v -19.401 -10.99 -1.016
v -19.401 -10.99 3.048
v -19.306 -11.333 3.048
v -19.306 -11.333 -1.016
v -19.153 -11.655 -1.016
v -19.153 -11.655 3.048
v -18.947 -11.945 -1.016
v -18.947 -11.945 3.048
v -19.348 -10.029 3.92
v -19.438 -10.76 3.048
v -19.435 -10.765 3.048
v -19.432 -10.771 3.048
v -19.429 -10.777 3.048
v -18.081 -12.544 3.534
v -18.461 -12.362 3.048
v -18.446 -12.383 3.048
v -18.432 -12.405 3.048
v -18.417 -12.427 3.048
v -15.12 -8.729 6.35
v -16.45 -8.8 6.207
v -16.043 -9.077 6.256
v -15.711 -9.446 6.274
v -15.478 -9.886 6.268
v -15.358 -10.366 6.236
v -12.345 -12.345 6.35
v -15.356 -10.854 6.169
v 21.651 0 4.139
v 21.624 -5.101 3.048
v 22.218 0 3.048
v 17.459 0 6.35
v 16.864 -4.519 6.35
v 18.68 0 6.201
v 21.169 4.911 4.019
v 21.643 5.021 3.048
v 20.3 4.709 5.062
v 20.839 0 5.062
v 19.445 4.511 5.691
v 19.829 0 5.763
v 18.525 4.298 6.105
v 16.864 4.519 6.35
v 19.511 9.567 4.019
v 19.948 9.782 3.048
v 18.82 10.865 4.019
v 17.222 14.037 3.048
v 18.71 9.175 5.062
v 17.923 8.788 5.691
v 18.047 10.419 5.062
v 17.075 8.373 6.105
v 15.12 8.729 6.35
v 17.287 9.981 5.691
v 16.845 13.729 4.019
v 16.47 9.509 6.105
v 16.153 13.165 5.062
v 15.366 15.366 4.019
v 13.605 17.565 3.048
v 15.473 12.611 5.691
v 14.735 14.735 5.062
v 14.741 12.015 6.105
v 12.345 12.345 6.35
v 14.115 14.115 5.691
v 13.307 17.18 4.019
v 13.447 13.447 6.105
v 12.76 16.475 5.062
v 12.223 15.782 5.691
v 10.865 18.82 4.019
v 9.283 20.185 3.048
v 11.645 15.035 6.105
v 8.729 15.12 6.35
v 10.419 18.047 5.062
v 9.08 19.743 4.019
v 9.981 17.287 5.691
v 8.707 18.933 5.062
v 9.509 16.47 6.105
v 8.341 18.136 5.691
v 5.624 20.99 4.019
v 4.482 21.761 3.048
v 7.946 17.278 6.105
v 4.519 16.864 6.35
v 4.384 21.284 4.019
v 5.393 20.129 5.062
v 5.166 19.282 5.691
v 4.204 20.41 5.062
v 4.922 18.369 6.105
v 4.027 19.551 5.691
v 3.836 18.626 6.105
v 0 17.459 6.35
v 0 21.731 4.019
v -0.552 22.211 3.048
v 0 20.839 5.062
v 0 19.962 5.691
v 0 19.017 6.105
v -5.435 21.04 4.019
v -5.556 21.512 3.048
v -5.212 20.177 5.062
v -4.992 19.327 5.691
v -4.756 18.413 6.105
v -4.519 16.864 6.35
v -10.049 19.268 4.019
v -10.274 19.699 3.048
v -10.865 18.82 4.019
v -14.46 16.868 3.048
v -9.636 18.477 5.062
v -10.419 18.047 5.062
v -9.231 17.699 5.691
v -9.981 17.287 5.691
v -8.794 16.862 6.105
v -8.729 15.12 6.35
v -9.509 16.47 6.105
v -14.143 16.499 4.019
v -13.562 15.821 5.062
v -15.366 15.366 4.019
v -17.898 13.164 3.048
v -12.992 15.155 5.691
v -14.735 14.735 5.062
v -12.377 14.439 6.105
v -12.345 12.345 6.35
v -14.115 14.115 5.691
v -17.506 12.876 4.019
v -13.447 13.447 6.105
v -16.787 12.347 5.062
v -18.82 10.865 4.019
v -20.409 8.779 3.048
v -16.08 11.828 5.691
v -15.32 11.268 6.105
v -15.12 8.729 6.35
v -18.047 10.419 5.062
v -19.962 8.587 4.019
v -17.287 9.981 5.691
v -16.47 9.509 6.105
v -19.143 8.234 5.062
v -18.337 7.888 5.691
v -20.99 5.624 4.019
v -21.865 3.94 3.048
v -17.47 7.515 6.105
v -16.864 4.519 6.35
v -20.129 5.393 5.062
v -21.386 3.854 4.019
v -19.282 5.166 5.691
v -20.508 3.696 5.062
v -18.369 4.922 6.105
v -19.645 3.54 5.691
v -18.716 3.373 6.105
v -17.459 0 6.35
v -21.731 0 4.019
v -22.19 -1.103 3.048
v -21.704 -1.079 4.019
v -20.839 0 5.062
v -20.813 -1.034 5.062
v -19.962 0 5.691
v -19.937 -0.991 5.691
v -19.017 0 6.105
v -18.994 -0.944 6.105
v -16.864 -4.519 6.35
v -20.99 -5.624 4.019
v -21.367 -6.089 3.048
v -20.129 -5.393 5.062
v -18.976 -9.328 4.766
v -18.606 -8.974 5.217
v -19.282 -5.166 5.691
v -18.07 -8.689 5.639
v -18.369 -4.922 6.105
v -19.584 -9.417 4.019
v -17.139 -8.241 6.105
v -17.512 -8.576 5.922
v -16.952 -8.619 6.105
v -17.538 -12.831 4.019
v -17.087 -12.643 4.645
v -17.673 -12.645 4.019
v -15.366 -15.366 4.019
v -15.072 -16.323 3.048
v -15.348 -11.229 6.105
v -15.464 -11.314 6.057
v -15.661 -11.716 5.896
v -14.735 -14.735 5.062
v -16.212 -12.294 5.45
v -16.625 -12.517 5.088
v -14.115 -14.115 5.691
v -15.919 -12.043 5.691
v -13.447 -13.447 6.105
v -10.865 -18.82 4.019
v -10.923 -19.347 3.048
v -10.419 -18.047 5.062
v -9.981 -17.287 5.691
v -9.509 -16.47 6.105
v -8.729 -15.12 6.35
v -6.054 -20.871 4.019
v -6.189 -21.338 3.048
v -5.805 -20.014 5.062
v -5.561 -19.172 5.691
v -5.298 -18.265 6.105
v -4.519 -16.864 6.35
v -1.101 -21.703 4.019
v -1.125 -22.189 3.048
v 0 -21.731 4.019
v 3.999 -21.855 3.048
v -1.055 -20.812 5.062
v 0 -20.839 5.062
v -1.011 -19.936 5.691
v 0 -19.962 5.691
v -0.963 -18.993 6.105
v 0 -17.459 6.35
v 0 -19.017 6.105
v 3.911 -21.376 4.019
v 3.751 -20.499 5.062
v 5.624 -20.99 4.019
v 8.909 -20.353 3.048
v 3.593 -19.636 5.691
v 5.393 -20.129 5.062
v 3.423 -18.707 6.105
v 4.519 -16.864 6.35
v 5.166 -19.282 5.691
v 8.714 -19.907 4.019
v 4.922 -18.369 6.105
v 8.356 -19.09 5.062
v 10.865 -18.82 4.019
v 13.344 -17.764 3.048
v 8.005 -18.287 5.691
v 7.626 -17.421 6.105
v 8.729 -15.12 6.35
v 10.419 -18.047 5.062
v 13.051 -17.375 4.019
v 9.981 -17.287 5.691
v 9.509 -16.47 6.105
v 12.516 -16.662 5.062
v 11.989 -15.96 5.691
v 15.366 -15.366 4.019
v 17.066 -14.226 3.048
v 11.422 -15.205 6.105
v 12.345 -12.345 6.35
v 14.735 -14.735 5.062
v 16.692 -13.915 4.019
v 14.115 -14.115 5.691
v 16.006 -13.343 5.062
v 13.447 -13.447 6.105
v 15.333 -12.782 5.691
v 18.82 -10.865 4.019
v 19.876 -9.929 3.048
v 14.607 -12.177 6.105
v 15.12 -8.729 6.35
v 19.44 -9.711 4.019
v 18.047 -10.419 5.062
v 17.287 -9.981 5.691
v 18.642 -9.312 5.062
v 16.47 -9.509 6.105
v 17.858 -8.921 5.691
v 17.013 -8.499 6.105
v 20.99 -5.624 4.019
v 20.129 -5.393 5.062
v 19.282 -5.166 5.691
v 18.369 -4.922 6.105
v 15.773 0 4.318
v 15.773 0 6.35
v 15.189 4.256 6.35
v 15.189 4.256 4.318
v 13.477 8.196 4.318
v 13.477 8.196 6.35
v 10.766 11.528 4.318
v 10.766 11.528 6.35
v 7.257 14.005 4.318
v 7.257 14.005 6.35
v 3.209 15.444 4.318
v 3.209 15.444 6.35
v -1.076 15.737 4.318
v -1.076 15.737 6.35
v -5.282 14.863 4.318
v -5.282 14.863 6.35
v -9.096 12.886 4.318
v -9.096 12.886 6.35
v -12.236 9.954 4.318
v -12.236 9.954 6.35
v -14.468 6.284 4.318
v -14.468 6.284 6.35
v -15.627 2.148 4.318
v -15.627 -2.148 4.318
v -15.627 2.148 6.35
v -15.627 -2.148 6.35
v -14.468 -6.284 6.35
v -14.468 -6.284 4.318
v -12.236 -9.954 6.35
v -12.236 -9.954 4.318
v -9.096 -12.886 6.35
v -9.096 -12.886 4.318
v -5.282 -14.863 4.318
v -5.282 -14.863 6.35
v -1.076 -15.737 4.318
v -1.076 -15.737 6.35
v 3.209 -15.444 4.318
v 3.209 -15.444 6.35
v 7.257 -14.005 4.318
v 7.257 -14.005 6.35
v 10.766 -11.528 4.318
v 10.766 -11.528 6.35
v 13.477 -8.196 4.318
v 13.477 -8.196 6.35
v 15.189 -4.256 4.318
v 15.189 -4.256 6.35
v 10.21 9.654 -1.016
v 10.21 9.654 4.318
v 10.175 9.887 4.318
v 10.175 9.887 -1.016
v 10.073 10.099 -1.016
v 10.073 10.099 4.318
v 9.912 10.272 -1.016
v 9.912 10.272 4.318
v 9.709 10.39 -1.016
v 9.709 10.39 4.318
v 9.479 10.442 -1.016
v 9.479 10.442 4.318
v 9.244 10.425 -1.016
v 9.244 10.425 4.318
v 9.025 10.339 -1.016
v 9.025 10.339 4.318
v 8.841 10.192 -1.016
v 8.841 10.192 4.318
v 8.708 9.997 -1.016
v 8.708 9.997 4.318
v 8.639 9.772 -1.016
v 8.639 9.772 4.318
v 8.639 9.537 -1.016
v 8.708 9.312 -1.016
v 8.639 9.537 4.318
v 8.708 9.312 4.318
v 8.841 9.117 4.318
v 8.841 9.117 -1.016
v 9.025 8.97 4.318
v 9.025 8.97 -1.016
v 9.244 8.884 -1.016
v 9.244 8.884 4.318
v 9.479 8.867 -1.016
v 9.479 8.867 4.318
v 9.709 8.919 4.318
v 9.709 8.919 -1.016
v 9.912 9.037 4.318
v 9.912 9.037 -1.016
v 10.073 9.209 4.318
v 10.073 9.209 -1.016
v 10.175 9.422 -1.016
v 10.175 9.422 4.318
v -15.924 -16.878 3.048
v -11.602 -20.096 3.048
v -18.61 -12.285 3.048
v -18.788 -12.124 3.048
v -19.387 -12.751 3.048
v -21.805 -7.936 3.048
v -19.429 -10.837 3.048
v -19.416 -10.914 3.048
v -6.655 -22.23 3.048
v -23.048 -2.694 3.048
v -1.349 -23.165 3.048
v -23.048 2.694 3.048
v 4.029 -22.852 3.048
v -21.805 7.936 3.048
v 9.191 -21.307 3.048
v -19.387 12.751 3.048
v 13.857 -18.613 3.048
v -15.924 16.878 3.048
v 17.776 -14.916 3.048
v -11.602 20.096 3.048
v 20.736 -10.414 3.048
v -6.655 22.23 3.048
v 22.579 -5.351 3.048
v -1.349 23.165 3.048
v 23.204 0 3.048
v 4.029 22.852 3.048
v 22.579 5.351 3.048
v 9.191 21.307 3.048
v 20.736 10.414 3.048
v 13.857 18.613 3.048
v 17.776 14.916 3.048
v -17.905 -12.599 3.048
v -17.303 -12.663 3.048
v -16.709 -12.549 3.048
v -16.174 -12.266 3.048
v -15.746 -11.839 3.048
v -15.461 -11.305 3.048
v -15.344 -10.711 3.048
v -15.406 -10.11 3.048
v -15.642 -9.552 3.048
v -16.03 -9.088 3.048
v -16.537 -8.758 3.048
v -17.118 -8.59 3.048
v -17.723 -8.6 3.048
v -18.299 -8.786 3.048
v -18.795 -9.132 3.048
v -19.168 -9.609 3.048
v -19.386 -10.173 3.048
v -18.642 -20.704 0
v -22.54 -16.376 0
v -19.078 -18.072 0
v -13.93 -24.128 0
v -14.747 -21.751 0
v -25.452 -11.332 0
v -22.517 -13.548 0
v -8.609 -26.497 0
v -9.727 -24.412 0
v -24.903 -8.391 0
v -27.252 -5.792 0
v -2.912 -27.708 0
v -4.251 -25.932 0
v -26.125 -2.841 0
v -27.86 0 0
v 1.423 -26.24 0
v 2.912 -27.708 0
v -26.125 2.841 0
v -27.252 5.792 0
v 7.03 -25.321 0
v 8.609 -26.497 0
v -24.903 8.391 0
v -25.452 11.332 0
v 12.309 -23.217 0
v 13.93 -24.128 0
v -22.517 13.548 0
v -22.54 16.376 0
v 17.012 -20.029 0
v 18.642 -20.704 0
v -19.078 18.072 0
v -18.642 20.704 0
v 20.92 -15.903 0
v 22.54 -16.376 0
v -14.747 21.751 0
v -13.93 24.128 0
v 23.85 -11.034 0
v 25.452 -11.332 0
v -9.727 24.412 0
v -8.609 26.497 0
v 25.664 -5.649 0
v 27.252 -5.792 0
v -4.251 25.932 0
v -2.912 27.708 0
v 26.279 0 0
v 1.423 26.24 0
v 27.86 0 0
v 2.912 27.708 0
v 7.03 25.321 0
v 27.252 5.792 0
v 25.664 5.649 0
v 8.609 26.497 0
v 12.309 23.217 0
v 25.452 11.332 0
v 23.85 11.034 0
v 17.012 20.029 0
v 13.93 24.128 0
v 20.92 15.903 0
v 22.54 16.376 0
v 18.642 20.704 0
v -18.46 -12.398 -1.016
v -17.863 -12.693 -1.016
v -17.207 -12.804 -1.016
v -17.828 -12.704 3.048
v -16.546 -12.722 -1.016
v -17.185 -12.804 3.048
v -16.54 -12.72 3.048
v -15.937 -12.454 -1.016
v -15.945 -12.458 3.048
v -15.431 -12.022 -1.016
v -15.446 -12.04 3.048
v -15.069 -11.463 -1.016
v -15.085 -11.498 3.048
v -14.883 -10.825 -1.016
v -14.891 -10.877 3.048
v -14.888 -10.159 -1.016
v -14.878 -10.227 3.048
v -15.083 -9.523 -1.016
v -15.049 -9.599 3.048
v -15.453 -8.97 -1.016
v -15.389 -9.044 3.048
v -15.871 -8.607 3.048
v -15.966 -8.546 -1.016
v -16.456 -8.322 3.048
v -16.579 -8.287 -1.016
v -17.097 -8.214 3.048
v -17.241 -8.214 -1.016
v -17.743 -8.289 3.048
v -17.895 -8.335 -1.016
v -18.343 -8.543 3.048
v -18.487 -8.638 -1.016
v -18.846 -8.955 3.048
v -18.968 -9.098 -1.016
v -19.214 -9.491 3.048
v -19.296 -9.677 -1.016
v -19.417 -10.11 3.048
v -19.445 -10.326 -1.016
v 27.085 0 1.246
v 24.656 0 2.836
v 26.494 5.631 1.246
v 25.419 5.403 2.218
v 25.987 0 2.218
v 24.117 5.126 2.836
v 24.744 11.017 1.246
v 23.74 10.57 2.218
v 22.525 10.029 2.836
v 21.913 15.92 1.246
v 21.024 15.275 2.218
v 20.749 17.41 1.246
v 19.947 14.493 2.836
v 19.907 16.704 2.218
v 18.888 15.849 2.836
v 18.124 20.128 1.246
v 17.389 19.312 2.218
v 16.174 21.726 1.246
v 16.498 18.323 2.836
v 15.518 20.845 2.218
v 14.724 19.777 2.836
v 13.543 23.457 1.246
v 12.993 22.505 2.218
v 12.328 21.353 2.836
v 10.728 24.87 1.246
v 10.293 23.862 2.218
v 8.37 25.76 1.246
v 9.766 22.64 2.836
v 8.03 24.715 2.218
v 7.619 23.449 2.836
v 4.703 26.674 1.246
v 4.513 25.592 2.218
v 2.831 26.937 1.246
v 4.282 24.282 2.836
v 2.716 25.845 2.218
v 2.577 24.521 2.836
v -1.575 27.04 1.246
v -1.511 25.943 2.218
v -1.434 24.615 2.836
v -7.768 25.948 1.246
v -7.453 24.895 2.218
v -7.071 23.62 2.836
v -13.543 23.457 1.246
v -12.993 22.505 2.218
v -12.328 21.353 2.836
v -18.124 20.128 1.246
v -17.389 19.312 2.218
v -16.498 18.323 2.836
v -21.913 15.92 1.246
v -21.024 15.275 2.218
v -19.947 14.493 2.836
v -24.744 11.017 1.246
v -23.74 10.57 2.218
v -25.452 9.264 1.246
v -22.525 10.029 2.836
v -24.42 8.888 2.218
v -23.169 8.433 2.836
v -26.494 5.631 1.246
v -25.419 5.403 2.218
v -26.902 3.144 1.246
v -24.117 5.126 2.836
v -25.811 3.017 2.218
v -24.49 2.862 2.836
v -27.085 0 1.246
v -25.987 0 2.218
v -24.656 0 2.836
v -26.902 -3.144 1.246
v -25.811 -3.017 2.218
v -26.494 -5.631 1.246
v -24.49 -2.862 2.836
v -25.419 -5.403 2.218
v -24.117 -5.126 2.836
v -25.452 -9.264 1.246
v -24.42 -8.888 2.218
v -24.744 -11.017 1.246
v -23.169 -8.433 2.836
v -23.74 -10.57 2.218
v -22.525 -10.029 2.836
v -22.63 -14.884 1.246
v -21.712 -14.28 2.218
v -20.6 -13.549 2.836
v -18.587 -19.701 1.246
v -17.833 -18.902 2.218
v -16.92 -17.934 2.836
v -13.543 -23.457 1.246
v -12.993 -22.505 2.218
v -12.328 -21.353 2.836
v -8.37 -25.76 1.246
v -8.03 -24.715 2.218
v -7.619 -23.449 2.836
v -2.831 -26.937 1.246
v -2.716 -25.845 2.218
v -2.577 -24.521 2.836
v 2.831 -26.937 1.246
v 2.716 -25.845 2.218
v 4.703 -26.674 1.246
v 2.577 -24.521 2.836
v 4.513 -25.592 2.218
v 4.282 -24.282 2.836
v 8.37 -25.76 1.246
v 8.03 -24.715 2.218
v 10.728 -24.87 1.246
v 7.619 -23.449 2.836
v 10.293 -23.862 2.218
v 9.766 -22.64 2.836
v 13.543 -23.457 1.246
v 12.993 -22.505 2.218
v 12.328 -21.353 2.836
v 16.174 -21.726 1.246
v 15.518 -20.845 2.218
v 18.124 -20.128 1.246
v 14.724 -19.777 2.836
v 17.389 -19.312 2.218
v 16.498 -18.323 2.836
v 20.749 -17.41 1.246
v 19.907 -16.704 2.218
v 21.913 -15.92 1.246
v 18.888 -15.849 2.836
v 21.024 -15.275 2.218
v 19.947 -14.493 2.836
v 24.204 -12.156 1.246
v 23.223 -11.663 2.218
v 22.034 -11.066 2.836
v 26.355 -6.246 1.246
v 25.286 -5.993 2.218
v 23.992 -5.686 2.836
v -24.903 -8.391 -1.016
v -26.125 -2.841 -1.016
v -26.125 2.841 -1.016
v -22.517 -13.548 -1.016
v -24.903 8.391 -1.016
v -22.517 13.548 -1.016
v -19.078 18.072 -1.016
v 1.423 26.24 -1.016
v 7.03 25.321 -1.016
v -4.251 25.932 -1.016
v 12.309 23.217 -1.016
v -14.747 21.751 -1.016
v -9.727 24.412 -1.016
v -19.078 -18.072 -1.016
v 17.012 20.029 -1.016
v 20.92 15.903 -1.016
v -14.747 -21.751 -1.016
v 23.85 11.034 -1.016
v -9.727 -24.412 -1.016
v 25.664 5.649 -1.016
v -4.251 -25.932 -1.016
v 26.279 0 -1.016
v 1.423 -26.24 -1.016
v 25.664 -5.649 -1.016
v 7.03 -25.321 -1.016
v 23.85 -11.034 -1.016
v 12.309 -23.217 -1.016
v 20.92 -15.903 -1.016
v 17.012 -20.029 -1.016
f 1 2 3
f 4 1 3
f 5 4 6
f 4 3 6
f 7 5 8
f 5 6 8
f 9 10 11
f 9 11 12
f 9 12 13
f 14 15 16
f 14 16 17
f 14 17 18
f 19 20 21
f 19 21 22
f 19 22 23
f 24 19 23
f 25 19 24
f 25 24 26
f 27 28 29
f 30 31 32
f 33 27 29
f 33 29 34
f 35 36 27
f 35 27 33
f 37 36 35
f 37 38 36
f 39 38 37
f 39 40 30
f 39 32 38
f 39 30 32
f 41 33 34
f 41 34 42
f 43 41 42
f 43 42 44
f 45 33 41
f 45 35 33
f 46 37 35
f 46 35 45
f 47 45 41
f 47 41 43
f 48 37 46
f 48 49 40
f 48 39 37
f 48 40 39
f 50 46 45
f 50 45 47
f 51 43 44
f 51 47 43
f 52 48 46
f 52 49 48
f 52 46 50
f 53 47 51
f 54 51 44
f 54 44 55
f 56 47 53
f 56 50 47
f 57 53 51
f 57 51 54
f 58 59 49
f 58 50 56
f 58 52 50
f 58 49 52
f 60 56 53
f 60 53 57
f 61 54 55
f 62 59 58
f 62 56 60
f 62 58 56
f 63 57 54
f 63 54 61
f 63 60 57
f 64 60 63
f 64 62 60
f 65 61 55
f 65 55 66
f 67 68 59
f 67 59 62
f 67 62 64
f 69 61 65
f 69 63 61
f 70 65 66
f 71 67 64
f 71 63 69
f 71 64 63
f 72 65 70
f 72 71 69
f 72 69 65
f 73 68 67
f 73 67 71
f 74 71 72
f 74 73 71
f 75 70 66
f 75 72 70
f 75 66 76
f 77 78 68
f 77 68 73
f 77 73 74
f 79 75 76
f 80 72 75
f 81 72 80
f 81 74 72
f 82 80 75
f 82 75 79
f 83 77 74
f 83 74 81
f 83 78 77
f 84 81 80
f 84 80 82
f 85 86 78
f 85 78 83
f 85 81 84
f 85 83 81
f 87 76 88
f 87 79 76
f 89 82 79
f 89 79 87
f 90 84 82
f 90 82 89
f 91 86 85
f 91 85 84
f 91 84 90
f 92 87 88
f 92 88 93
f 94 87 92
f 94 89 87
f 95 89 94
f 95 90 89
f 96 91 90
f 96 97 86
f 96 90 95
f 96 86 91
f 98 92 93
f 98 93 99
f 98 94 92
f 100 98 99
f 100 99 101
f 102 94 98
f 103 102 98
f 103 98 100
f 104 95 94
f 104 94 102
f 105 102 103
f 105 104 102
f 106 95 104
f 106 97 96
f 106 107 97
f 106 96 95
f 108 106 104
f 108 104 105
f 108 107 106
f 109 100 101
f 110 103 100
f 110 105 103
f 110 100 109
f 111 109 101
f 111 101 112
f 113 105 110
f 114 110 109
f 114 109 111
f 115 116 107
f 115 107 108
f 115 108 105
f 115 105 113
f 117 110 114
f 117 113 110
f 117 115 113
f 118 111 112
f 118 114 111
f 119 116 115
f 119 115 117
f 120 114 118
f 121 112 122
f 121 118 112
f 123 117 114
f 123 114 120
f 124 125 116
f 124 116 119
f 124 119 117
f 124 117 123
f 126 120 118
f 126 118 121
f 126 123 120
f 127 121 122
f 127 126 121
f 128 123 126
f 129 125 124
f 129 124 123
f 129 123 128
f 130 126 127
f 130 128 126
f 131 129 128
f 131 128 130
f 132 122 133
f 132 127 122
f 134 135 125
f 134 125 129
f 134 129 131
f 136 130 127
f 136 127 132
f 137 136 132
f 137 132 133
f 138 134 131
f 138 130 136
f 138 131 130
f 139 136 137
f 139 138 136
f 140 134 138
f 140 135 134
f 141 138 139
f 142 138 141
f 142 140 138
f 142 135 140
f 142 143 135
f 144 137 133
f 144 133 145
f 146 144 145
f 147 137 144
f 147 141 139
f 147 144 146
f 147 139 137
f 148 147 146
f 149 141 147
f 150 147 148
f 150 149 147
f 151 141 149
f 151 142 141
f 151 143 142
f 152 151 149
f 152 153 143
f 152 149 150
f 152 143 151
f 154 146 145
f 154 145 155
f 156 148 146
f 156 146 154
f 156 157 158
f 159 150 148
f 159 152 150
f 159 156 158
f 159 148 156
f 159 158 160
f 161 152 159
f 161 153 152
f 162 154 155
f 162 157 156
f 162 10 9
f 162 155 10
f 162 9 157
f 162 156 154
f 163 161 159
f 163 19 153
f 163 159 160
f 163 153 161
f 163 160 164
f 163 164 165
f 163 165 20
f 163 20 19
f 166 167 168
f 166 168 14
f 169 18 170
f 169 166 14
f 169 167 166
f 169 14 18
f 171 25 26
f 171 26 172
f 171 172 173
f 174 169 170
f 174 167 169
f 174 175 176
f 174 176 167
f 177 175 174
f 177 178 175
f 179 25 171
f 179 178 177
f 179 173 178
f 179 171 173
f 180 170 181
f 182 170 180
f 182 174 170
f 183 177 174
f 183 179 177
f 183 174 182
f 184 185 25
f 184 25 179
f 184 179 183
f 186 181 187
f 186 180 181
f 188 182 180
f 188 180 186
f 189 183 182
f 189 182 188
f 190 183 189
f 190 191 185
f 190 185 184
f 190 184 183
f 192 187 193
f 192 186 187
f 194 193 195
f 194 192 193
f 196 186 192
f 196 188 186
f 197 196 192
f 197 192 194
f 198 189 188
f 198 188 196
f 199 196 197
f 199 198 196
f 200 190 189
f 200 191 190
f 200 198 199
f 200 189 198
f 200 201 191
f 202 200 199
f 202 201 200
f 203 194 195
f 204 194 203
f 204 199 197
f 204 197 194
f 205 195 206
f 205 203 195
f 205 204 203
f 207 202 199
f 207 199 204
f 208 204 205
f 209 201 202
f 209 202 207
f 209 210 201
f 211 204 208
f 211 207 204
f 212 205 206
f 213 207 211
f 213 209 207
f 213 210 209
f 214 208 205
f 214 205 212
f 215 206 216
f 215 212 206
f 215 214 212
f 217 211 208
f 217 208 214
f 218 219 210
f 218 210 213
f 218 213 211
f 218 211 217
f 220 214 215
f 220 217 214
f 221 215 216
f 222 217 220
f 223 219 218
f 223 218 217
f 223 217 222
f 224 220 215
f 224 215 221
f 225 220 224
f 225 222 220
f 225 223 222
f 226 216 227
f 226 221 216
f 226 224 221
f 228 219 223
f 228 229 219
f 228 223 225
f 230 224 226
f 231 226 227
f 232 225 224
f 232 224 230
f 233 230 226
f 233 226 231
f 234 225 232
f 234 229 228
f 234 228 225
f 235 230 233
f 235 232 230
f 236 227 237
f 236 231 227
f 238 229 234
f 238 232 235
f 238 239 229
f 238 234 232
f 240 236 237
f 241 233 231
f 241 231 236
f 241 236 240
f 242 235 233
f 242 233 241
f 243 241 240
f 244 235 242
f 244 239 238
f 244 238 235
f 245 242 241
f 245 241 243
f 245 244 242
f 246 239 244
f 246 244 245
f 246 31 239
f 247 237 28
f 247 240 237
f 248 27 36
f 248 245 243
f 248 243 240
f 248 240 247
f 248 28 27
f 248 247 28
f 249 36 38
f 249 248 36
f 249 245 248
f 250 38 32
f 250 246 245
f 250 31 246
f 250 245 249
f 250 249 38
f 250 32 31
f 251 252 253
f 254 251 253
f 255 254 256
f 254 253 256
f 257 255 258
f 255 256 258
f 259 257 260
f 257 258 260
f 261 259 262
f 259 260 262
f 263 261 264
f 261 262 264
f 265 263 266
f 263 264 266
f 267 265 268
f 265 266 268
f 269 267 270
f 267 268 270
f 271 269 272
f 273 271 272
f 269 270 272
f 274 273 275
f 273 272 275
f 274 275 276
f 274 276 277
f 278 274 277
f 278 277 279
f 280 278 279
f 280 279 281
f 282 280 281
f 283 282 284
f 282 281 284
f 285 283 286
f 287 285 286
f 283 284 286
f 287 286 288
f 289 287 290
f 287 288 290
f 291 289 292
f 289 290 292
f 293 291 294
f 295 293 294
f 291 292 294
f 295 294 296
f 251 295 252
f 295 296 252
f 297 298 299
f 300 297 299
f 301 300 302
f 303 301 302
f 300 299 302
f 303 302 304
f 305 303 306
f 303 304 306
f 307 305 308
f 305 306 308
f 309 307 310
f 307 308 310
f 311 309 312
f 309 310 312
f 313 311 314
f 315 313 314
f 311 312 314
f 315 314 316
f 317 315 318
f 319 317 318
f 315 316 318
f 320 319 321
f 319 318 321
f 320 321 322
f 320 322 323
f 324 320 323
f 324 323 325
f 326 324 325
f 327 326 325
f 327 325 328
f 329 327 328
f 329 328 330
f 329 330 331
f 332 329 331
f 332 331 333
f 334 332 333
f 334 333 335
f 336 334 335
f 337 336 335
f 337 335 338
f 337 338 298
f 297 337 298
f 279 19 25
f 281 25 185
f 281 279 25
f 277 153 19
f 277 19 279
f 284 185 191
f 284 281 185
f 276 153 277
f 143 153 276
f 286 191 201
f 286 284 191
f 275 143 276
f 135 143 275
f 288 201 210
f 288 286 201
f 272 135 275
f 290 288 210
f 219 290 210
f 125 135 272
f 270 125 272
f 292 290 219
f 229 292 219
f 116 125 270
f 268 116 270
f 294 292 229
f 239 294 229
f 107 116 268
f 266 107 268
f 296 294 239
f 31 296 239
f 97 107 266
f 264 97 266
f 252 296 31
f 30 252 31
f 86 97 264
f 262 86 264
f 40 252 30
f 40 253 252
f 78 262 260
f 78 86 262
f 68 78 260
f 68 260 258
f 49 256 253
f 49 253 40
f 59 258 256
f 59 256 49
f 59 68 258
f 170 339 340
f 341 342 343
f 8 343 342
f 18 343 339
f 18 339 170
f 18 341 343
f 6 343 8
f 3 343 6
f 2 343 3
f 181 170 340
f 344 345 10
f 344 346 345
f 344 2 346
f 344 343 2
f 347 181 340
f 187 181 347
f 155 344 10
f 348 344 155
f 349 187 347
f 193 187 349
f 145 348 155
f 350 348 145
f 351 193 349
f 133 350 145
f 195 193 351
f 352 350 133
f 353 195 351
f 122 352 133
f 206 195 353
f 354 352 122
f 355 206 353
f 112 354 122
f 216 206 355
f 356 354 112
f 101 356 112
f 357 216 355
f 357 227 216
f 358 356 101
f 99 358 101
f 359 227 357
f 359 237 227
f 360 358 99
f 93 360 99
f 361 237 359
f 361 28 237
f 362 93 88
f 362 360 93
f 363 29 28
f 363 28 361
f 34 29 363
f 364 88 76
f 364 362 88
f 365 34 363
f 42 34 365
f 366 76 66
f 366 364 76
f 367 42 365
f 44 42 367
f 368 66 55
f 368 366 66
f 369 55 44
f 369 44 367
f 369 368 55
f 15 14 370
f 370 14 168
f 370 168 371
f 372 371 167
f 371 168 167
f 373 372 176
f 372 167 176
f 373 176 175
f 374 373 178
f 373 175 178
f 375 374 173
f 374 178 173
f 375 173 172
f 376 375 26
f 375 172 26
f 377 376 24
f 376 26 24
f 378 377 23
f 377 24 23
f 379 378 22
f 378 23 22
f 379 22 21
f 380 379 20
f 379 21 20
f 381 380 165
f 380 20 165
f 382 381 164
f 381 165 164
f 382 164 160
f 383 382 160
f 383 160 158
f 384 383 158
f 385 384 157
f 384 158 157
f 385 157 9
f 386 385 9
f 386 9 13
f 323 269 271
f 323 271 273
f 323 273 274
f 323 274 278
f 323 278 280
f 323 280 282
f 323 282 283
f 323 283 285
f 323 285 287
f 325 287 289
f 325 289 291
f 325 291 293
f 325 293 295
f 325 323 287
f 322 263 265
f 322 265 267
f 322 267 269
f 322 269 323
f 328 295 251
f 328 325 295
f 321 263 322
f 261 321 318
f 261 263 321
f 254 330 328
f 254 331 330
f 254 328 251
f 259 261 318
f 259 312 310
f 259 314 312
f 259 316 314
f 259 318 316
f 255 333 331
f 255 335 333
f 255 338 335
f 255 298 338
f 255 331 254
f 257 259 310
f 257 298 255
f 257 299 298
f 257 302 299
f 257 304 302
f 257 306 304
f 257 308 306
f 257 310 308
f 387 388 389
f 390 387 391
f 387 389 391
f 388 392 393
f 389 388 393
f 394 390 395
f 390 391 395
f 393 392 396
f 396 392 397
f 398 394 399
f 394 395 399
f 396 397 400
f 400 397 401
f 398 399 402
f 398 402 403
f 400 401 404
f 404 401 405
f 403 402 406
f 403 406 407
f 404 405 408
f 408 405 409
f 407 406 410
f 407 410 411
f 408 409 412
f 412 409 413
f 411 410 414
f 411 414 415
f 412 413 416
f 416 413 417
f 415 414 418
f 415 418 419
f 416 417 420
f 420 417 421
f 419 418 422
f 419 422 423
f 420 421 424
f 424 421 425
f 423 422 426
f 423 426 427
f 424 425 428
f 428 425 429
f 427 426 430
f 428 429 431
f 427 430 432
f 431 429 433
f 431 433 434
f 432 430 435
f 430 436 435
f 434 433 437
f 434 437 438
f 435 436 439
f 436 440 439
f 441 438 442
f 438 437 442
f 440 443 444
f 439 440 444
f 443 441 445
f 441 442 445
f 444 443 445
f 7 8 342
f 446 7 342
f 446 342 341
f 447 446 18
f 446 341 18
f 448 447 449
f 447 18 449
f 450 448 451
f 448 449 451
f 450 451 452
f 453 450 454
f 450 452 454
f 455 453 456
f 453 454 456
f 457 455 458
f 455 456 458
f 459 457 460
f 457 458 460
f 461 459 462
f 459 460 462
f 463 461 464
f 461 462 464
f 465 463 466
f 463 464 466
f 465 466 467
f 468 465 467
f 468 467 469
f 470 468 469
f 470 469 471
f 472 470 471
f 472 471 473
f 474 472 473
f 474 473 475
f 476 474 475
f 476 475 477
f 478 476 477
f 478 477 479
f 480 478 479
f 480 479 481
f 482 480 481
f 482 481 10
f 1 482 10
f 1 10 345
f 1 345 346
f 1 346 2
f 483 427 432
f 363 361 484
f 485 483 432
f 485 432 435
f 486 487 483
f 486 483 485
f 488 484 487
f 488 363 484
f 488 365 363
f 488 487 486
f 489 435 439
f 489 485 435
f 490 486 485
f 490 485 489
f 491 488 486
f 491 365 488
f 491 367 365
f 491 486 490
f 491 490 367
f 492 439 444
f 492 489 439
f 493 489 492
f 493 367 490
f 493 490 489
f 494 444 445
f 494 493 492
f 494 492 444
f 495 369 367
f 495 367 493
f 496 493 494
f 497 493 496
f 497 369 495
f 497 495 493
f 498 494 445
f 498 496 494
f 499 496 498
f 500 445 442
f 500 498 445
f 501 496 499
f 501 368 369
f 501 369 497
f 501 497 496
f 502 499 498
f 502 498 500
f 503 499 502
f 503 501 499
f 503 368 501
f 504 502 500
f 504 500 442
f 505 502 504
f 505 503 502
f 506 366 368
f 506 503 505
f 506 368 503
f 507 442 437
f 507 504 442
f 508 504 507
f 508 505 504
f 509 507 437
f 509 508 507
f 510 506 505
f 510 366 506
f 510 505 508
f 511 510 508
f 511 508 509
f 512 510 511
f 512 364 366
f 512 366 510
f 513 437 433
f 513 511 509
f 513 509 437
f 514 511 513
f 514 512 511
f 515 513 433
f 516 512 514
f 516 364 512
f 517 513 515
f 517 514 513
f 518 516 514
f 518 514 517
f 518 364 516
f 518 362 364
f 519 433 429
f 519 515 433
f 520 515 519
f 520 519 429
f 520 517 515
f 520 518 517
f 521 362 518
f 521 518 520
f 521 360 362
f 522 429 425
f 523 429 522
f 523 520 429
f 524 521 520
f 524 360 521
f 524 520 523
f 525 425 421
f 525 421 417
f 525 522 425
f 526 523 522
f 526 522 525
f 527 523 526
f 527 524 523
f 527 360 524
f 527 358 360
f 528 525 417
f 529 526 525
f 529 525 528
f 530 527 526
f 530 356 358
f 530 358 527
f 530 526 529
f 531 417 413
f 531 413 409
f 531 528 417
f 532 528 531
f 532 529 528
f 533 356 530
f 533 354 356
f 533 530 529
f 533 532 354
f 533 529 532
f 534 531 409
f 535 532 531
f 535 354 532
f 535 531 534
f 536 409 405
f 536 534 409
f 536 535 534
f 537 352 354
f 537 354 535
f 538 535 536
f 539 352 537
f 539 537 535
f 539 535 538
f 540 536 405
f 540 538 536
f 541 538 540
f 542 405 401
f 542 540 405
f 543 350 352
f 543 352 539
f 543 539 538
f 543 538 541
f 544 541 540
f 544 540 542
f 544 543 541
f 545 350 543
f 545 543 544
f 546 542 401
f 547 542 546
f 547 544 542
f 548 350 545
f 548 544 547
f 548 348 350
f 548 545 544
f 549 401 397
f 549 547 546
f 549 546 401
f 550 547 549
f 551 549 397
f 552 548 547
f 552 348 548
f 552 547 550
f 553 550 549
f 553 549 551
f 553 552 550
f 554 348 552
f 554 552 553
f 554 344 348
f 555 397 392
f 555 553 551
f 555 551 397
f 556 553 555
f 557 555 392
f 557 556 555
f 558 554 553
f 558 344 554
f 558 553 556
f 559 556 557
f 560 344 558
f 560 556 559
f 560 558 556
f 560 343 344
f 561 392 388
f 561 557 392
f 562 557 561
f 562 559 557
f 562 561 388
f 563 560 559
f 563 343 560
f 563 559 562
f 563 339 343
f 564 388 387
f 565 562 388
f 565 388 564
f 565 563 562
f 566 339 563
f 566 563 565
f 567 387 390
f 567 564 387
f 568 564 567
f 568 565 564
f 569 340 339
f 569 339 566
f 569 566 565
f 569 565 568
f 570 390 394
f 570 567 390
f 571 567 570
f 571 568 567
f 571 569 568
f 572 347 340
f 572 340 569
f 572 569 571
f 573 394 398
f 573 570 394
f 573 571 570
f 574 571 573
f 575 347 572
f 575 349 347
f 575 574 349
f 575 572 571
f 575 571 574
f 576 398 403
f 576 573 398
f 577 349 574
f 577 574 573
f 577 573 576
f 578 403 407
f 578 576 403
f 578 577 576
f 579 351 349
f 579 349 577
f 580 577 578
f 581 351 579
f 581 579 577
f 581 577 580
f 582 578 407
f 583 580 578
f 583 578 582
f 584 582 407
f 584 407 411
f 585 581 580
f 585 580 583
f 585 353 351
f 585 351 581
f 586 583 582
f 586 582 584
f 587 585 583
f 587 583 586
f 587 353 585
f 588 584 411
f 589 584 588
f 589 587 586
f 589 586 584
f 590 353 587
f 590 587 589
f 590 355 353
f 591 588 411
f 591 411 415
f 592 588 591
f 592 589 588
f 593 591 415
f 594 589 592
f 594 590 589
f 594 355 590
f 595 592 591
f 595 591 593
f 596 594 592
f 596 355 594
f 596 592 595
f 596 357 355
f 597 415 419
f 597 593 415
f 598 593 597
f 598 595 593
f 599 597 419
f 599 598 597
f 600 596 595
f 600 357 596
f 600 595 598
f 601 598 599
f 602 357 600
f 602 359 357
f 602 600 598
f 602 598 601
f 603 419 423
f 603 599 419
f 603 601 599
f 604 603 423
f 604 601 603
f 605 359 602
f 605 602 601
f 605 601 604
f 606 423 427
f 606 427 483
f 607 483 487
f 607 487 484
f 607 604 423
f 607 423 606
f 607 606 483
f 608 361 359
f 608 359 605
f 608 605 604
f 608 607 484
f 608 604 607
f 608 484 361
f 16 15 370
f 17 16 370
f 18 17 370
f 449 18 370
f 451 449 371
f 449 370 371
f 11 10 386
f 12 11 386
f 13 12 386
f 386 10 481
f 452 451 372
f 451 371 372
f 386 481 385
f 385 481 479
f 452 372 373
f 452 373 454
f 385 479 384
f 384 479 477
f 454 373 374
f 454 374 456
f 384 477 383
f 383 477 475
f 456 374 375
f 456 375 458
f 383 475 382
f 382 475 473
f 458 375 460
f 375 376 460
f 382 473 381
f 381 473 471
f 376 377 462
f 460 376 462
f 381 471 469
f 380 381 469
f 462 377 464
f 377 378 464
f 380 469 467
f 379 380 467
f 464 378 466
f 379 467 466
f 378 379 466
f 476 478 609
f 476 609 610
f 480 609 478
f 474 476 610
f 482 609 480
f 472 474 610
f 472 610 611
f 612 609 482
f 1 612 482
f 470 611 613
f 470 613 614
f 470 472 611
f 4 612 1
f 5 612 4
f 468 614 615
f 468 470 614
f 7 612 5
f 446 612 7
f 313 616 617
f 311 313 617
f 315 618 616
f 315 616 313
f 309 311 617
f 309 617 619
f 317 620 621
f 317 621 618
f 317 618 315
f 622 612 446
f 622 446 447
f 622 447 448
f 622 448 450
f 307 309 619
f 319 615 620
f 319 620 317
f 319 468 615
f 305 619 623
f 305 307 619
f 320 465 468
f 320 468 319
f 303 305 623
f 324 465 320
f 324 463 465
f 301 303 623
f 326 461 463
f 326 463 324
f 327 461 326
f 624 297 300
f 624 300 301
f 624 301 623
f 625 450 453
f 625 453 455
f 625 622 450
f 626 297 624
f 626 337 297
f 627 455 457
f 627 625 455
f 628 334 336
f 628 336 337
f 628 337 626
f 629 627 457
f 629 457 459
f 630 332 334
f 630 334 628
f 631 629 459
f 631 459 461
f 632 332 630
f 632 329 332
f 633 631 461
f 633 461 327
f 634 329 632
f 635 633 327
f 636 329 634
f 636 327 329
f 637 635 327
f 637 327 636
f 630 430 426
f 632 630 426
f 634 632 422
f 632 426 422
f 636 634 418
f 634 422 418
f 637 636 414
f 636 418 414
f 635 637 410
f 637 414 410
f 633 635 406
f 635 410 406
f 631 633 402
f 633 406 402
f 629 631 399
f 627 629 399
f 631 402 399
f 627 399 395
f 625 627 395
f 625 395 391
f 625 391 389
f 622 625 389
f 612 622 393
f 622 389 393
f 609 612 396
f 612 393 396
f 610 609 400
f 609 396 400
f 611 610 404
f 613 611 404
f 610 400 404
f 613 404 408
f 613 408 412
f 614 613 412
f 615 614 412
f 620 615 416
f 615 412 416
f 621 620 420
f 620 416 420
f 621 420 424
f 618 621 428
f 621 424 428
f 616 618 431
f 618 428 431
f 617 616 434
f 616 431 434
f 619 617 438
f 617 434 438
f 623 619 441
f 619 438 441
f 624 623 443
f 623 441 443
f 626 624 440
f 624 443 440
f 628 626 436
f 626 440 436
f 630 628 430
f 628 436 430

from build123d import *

# Parameters (mm, degrees)
F0_R      = 27.8603665739
F1_DEPTH  = 3.048
F4_R      = 26.2786257822
F5_DEPTH  = 1.016
F6_R      = 22.2176168744
F7_DEPTH  = 3.302
F9_R      = 15.773437446
F10_DEPTH = 2.032
F11_R     = 2.2956006308
F12_DEPTH = 21.336
F13_R     = 2.0464830212
F14_DEPTH = 25.4
F15_R     = 0.7900286513
F16_DEPTH = 25.4


# Not quite as in the source:
# - a fillet or chamfer that OpenCascade refuses, or shapes differently, is made with other operations: its cross-section is extruded or revolved along the edge and cut away or added


with BuildPart() as f1:
    # F0 (on Top) → F1 (new body)
    with BuildSketch(Plane.XY):
        Circle(F0_R)
    extrude(amount=F1_DEPTH)

    # F2: fillet of radius 5.08 on 1 edges, made by hand

    # F2_s1 → F2_t2 (revolve, cut)
    with BuildSketch(Plane.XZ):
        with BuildLine():
            ThreePointArc((27.8603665739, 0), (25.9869002599, 2.2182329348), (23.2044696678, 3.048))
            Line((23.2044696678, 3.048), (27.8603665739, 3.048))
            Line((27.8603665739, 3.048), (27.8603665739, 0))
        make_face()
    revolve(axis=Axis((0, 0, 3.048), (0, 0, 1)), mode=Mode.SUBTRACT)

    # F4 (on face) → F5 (join)
    with BuildSketch(Plane(origin=(0, 0, 0), x_dir=(1, 0, 0), z_dir=(0, 0, -1))):
        Circle(F4_R)
    extrude(amount=F5_DEPTH)

    # F6 (on face) → F7 (join)
    with BuildSketch(Plane.XY.offset(3.048)):
        Circle(F6_R)
    extrude(amount=F7_DEPTH)

    # F8: fillet of radius 5.08 on 1 edges, made by hand

    # F8_s1 → F8_t2 (revolve, cut)
    with BuildSketch(Plane.XZ):
        with BuildLine():
            ThreePointArc((22.2176168744, 3.048), (20.3549739793, 5.4436458882), (17.4589283996, 6.35))
            Line((17.4589283996, 6.35), (22.2176168744, 6.35))
            Line((22.2176168744, 6.35), (22.2176168744, 3.048))
        make_face()
    revolve(axis=Axis((0, 0, 6.35), (0, 0, 1)), mode=Mode.SUBTRACT)

    # F9 (on face) → F10 (cut)
    with BuildSketch(Plane.XY.offset(6.35)):
        Circle(F9_R)
    extrude(amount=-F10_DEPTH, mode=Mode.SUBTRACT)

    # F11 (on face) → F12 (cut)
    with BuildSketch(Plane.XY.offset(3.048)):
        with Locations((-17.1565320343, -10.5084851384)):
            Circle(F11_R)
    extrude(amount=-F12_DEPTH, mode=Mode.SUBTRACT)

    # F13 (on face) → F14 (cut)
    with BuildSketch(Plane.XY.offset(6.35)):
        with Locations((-17.3885338008, -10.6187639758)):
            Circle(F13_R)
    extrude(amount=-F14_DEPTH, mode=Mode.SUBTRACT)

    # F15 (on face) → F16 (cut)
    with BuildSketch(Plane.XY.offset(4.318)):
        with Locations((9.4199227169, 9.6543869004)):
            Circle(F15_R)
    extrude(amount=-F16_DEPTH, mode=Mode.SUBTRACT)


solid = f1.part
